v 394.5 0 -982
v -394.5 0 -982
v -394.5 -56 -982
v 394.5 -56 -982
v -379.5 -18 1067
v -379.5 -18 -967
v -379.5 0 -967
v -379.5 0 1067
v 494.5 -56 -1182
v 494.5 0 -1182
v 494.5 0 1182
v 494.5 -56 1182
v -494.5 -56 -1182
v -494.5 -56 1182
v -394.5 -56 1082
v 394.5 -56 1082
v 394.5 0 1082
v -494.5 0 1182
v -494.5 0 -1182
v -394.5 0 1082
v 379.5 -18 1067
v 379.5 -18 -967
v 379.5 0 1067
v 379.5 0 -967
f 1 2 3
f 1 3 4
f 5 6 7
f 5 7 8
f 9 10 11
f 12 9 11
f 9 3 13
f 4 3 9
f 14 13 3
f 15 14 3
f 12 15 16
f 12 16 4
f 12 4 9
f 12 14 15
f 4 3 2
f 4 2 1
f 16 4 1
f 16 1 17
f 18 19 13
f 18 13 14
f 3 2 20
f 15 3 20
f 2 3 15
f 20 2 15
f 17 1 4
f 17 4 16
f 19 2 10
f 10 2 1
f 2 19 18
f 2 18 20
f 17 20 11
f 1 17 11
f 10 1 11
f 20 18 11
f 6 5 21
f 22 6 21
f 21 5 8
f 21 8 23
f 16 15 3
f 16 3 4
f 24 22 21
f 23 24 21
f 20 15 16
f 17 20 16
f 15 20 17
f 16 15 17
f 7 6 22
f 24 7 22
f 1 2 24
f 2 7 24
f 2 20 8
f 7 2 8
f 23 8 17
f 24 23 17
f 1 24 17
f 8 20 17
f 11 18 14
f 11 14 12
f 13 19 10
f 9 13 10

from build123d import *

# Parameters (mm, degrees)
F0_W     = 989
F0_H     = 2364
F0_W_2   = 789
F0_H_2   = 2064
F1_DEPTH = 56
F2_W     = 789
F2_H     = 2064
F2_W_2   = 759
F2_H_2   = 2034
F3_DEPTH = 56
F4_W     = 759
F4_H     = 2034
F5_DEPTH = 38


with BuildPart() as f1:
    # F0 (on Front) → F1 (new body)
    with BuildSketch(Plane.XZ):
        Rectangle(F0_W, F0_H)
        with Locations((0, 50)):
            Rectangle(F0_W_2, F0_H_2, mode=Mode.SUBTRACT)
    extrude(amount=F1_DEPTH)


with BuildPart() as f3:
    # F2 (on face) → F3 (new body)
    with BuildSketch(Plane.XZ.offset(56)):
        with Locations((0, 50)):
            Rectangle(F2_W, F2_H)
        with Locations((0, 50)):
            Rectangle(F2_W_2, F2_H_2, mode=Mode.SUBTRACT)
    extrude(amount=-F3_DEPTH)

    # F4 (on face) → F5 (join)
    with BuildSketch(Plane.XZ.offset(56)):
        with Locations((0, 50)):
            Rectangle(F4_W, F4_H)
    extrude(amount=-F5_DEPTH)


solid = Compound([f1.part, f3.part])
